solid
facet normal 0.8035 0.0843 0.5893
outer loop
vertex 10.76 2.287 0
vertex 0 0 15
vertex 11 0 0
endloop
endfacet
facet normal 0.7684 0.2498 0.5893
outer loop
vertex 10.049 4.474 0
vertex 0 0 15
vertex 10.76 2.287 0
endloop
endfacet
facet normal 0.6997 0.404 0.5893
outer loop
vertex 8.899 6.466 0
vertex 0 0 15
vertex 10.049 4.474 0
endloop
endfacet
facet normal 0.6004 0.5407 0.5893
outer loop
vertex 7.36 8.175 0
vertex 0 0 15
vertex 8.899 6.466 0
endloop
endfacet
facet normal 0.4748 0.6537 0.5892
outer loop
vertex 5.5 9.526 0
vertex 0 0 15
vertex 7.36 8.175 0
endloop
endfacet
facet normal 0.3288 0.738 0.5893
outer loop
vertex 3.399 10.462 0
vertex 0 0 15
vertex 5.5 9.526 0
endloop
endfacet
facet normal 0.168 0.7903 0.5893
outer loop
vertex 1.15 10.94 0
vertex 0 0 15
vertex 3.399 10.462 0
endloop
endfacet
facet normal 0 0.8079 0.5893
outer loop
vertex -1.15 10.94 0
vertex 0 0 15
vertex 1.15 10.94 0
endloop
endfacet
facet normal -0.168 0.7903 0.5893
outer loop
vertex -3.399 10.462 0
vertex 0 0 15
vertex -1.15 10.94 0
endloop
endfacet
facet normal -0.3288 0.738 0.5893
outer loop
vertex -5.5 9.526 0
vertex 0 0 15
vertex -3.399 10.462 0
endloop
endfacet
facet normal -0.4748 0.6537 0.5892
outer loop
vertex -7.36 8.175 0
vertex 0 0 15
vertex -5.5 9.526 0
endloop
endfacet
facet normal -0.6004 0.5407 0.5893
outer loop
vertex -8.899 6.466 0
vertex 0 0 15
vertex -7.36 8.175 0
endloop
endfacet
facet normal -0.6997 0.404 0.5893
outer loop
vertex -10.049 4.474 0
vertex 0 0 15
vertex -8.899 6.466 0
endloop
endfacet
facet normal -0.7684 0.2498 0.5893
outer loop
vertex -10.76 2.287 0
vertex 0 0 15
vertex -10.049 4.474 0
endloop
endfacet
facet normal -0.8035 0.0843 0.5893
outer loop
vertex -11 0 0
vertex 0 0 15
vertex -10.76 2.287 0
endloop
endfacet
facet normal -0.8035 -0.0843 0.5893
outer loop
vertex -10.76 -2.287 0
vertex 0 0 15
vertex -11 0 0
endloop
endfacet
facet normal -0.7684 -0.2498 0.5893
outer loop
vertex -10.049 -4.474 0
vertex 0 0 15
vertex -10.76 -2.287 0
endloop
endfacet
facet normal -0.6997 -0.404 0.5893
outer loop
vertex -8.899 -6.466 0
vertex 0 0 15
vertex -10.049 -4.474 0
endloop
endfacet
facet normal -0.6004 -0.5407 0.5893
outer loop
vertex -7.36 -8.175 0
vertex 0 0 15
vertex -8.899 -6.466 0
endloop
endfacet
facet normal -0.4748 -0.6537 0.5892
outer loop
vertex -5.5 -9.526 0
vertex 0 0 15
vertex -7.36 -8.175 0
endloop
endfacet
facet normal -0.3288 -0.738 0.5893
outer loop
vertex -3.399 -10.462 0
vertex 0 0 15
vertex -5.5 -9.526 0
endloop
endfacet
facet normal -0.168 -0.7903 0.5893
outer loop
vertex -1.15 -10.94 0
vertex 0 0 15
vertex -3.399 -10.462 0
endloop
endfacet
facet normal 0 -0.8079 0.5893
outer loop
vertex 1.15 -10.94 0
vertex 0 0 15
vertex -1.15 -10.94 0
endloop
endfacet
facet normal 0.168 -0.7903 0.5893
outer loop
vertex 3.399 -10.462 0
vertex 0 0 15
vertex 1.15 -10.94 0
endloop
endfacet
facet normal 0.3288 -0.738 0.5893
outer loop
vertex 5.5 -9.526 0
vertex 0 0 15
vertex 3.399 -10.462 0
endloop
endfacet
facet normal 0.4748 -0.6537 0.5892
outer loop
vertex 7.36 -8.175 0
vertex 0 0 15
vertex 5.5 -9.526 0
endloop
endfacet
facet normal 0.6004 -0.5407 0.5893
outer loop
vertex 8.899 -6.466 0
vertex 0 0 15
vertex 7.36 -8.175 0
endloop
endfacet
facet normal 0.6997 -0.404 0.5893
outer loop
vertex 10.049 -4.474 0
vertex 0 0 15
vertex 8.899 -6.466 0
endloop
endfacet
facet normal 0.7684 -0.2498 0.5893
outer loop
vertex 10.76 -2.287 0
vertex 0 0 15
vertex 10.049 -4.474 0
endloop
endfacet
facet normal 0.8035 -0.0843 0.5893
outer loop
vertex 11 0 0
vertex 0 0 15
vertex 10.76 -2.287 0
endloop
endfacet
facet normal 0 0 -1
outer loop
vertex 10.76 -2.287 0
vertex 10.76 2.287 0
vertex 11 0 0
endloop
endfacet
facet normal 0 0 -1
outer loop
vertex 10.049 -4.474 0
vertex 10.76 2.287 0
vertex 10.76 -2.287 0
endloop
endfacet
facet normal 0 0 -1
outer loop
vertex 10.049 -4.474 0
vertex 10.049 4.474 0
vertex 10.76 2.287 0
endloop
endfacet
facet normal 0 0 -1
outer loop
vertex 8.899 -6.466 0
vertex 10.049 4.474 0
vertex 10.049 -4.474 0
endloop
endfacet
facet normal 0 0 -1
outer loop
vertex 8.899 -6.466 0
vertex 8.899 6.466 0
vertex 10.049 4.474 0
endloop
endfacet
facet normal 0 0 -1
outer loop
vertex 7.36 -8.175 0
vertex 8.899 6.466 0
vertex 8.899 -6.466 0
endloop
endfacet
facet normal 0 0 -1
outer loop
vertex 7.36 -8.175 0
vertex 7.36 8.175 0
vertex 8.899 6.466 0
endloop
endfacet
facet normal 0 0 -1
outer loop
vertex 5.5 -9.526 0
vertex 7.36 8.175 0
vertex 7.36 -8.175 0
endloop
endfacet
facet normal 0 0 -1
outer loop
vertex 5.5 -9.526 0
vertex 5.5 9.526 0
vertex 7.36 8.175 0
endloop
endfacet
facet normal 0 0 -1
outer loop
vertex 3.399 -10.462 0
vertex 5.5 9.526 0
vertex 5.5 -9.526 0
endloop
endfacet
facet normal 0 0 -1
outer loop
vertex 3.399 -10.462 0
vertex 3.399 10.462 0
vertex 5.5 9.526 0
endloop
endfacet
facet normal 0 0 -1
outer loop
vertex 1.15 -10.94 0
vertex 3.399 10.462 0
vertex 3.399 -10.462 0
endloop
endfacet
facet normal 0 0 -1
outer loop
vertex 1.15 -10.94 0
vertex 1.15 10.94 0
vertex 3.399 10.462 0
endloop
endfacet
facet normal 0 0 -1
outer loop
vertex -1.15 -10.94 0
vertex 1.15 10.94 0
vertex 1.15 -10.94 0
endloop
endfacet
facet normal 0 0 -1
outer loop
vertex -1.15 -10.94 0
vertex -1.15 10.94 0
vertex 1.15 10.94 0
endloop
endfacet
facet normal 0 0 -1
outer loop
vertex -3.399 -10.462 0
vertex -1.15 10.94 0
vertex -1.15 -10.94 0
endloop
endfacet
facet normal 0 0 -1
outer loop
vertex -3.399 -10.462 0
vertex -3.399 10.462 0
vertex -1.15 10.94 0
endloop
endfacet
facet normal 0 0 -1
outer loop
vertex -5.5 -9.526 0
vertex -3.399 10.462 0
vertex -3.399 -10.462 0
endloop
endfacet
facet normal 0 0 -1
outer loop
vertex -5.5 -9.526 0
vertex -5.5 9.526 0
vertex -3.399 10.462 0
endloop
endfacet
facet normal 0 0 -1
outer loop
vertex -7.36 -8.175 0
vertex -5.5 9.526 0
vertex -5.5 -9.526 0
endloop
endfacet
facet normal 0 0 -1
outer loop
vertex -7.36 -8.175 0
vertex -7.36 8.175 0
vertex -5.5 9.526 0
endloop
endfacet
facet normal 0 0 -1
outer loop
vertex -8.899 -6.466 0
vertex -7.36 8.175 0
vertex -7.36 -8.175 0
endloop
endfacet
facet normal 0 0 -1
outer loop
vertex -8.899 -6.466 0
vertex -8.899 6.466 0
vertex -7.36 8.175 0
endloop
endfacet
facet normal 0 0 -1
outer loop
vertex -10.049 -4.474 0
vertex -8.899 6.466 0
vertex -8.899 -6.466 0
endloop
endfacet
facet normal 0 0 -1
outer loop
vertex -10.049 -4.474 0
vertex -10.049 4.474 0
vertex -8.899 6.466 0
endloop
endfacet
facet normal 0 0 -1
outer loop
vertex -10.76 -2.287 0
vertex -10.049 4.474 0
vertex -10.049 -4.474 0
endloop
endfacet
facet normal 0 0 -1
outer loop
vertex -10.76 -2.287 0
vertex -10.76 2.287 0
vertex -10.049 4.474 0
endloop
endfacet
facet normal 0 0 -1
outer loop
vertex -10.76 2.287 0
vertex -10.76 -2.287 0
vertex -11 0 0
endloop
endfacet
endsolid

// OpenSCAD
// Generated by SolidPython 1.0.1 on 2020-07-29 00:46:43


cylinder(h = 15, r1 = 11, r2 = 0);
/***********************************************
*********      SolidPython code:      **********
************************************************
 
# import packages: SolidPython
from solid import *
from solid.utils import *
from itertools import chain, combinations, permutations


class Resize:

    def __init__(self, scad_file):
        self.scad_file = scad_file
        #self.scad_file = import_scad(scad_file)
        # cone/cylinder param:
        self.r1 = 0
        self.r2 = 0
        self.h = 0
        # rectangular prism param:
        self.w = 0
        self.l = 0
        # ellipse param:
        self.r = 0

    # import OpenScad code (file name corresponds to shape)


    # classify shape + parameters
    def assign(self, param1, param2, param3):
        if self.scad_file == 'cone.scad':
            self.r1 = param1
            self.r2 = param2
            self.h = param3
        elif self.scad_file == 'cylinder.scad':
            self.r1 = param1
            self.r2 = param2
            self.h = param3
        elif self.scad_file == 'rectangularPrism.scad':
            self.h = param1
            self.l = param2
            self.w = param3
        else:
            self.r = param1
            self.h = param2

    # resize parameters
    def iterate(self):
        x = range(3, 20, 2)
        i = 1
        if self.scad_file == 'cone.scad':
            tempList = list(permutations(x, 2))
            for temp in tempList:
                param1 = temp[0]
                param2 = temp[1]
                filepath = 'produced_scad_files/' + 'cone' + str(param1) + '_' + str(param2) + '_' + '.scad'
                scad_render_to_file(cylinder(h=param1, r1=param2, r2=0), filepath)

        elif self.scad_file == 'cylinder.scad':
            tempList = list(permutations(x, 3))
            for temp in tempList:
                param1 = temp[0]
                param2 = temp[1]
                filepath = 'produced_scad_files/' + 'cylinder' + str(param1) + '_' + str(param2) + '_' + '.scad'
                scad_render_to_file(cylinder(h=param1, r1=param2, r2=param2), filepath)

        elif self.scad_file == 'rectangularPrism.scad':
            tempList = list(permutations(x, 3))
            for temp in tempList:
                param1 = temp[0]
                param2 = temp[1]
                param3 = temp[2]
                filepath = 'produced_scad_files/' + 'rectangularPrism' + str(param1) + '_' + str(param2) + '_' + str(
                    param3) + '.scad'
                scad_render_to_file(cube(size=(param1, param2, param3)), filepath)

        elif self.scad_file == 'ellipse.scad':
            tempList = list(permutations(x, 4))
            for temp in tempList:
                param1 = temp[0]
                param2 = temp[1]
                param3 = temp[2]
                param4 = temp[3]
                filepath = 'produced_scad_files/' + 'ellipse' + str(param1) + '_' + str(param2) + '_' + str(param3) + '_' + str(param4) + '.scad'
                scad_render_to_file(scale([param1, param2, param3])(sphere(r=param4)), filepath)

    def render_to_scadfile(self):
        scad_render_to_file(scad, 'example.scad') 
 
************************************************/
